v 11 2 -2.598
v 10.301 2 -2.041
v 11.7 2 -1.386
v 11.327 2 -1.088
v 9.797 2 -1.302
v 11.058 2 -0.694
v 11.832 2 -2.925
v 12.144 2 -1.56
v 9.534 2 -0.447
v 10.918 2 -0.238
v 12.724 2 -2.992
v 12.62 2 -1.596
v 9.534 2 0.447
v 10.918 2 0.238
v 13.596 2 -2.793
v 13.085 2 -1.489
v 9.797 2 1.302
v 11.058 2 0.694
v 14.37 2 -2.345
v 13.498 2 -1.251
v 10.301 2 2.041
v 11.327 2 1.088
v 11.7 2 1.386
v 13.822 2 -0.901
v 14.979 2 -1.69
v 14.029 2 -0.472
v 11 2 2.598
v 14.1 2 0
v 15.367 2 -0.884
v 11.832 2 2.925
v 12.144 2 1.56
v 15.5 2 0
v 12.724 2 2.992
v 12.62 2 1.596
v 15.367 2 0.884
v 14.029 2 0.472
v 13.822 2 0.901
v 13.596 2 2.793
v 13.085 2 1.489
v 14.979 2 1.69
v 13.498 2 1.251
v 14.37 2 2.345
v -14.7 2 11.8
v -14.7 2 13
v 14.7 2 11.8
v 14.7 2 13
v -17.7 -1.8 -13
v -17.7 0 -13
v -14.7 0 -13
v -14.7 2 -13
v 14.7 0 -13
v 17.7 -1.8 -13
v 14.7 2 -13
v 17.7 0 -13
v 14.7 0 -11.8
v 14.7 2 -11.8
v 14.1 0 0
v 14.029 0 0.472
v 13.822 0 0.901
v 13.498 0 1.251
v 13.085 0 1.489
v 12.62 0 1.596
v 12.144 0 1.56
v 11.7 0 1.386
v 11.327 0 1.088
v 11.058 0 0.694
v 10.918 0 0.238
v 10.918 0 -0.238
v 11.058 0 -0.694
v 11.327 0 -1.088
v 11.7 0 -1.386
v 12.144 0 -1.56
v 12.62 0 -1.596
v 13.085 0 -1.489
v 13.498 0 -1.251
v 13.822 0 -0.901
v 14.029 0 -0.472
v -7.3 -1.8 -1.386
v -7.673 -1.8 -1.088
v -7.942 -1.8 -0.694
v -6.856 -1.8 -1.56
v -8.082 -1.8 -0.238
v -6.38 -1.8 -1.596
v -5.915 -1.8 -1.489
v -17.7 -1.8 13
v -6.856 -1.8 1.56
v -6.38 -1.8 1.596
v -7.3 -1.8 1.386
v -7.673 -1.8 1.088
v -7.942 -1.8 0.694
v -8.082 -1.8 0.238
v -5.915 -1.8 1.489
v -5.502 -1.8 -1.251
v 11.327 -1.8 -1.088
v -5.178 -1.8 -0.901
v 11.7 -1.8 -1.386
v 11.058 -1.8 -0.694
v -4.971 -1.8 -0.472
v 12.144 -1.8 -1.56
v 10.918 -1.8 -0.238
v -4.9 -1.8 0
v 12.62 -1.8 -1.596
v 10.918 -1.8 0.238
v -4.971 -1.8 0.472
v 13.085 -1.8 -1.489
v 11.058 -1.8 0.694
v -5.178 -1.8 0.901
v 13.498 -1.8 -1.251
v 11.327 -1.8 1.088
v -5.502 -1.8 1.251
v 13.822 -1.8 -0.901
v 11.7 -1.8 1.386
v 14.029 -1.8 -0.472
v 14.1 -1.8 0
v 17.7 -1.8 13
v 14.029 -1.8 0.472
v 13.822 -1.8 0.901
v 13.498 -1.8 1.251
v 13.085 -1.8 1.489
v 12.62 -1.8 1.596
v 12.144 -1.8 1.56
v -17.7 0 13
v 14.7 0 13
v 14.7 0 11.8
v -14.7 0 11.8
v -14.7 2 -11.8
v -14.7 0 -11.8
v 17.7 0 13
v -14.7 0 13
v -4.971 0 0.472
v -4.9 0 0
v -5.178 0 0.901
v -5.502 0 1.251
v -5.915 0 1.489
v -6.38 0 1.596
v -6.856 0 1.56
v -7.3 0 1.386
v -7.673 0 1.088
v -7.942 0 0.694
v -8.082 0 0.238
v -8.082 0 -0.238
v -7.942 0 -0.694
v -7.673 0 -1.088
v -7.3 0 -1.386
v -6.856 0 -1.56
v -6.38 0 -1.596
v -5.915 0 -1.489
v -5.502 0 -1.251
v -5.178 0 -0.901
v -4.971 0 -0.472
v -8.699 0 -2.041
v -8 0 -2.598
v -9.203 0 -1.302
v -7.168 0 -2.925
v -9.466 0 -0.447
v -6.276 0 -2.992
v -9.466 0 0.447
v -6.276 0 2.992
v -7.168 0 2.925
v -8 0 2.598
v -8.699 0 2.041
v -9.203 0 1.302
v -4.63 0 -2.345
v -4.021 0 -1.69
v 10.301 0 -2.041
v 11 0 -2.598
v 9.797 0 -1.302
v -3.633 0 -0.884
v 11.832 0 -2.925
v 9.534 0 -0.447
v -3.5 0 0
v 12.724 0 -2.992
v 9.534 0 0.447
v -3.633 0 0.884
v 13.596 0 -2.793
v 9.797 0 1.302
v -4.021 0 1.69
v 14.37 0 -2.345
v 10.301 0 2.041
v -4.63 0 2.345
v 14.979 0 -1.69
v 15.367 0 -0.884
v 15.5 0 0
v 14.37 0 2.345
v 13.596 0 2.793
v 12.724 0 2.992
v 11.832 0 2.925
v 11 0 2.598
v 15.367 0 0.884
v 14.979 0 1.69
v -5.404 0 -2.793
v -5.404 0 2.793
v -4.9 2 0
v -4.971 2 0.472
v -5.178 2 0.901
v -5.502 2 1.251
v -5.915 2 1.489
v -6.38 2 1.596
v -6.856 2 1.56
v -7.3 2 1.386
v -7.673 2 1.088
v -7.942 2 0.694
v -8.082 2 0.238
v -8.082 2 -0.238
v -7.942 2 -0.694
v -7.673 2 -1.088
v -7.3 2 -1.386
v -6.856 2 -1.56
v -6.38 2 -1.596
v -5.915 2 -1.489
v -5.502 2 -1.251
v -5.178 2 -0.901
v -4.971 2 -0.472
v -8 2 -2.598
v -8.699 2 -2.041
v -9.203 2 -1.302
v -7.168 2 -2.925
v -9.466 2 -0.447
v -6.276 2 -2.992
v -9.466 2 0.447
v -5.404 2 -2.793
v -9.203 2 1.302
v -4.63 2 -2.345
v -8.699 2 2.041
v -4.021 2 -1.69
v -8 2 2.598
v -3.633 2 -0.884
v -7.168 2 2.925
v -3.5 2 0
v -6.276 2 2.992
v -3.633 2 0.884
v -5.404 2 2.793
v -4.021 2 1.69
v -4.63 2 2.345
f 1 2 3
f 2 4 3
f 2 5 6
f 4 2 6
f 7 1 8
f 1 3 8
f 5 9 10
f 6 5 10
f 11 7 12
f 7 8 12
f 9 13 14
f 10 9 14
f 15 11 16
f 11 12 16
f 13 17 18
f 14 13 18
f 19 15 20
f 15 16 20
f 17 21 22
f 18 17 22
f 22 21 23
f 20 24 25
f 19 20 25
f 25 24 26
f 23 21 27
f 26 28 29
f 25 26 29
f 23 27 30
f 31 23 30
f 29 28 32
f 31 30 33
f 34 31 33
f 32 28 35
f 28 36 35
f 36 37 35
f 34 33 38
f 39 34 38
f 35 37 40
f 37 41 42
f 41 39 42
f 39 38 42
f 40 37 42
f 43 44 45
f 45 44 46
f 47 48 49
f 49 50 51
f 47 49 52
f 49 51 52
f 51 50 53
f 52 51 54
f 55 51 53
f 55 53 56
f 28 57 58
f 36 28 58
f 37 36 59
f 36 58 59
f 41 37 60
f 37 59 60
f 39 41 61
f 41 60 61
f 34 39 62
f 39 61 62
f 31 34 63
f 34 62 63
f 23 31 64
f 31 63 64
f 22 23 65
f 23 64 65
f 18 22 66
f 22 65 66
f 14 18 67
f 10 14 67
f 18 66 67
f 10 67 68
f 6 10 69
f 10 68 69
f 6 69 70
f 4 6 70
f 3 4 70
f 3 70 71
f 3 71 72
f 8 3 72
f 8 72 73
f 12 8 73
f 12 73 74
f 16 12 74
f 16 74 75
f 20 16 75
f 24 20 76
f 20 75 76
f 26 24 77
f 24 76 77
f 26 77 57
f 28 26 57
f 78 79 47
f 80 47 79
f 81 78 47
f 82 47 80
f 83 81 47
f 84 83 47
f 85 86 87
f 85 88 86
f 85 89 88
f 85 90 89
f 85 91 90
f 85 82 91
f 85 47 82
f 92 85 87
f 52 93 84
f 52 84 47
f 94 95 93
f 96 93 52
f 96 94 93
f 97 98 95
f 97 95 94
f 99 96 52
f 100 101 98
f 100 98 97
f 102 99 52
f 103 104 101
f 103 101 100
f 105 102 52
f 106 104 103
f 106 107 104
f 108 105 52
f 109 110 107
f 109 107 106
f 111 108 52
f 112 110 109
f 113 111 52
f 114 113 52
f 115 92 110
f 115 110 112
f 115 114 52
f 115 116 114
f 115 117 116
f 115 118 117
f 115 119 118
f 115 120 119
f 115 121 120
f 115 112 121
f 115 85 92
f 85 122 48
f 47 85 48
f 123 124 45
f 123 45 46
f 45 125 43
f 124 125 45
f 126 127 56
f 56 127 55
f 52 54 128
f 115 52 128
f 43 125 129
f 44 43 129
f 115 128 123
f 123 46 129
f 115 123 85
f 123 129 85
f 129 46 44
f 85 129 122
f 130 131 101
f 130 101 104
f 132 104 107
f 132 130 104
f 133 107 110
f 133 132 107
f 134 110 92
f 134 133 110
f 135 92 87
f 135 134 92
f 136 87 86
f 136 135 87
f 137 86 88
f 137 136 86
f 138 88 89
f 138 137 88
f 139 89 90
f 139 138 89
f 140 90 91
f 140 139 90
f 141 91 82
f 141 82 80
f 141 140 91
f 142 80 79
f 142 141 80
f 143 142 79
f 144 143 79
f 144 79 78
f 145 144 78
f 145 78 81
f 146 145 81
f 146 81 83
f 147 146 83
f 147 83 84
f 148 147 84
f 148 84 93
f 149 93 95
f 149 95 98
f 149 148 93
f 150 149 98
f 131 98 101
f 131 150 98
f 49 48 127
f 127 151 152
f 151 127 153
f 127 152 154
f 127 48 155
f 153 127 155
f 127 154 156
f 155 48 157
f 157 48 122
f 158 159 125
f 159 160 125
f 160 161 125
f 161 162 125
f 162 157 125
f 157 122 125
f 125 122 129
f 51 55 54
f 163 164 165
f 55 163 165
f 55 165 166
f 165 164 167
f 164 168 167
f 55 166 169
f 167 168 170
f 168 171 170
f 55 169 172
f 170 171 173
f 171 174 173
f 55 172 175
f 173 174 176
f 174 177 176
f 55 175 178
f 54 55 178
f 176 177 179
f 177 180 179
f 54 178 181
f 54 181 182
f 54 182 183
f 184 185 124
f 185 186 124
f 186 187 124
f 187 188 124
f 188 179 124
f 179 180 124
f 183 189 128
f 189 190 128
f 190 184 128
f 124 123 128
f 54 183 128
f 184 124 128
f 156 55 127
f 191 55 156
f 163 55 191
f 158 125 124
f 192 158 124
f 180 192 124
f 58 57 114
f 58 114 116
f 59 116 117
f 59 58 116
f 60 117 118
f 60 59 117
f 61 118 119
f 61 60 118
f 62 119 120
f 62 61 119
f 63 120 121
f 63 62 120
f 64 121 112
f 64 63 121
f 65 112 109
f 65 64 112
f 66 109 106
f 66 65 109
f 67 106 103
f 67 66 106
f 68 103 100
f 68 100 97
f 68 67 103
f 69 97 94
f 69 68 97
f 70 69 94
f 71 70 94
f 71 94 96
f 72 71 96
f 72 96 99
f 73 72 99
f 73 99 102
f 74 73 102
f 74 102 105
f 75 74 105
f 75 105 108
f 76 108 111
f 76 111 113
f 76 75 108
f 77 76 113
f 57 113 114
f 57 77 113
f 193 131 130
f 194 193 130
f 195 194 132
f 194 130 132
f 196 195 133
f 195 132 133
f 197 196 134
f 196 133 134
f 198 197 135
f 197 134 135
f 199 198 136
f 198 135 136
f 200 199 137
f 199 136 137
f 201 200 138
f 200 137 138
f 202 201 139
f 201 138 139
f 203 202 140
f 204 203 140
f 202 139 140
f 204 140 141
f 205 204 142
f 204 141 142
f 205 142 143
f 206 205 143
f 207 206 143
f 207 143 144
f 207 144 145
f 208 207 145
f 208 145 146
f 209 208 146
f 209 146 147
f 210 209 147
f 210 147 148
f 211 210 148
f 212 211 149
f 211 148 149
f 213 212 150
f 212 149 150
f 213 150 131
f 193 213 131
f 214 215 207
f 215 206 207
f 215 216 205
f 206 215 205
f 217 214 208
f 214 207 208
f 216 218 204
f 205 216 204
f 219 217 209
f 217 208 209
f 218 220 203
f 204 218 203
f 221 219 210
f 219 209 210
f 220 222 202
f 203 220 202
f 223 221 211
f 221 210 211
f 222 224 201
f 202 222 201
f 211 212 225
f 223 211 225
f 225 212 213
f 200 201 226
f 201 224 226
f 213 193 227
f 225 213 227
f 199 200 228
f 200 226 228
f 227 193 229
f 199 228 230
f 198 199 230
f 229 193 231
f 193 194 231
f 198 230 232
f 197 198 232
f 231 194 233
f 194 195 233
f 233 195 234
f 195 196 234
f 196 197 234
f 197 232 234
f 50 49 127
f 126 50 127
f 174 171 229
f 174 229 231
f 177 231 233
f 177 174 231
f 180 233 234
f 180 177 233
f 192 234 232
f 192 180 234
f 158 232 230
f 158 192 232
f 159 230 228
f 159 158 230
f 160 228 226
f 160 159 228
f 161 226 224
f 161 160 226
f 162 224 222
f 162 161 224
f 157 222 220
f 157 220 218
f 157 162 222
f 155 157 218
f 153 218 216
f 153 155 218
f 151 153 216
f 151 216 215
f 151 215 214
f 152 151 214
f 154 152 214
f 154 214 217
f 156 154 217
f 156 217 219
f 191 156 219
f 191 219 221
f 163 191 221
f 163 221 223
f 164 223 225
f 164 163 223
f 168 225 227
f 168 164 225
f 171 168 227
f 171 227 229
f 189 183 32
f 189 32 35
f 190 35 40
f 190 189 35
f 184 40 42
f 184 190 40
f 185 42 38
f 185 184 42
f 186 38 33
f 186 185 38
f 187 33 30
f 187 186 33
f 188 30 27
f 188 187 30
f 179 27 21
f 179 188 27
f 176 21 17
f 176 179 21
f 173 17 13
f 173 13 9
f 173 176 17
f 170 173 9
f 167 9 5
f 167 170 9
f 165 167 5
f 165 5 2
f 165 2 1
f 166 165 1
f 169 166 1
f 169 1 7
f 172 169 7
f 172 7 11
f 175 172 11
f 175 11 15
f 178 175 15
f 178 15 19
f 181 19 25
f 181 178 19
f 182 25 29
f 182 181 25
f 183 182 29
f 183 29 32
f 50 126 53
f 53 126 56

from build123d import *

# Parameters (mm, degrees)
F0_R     = 3
F0_W     = 29.4
F0_H     = 1.2
F0_R_2   = 1.6
F1_DEPTH = 1.8
F2_DEPTH = 2


# Not quite as in the source:
# - a feature names something its author has since deleted; it is built from what else it names


with BuildPart() as f1:
    # F0 (on Front) → F1 (new body)
    with BuildSketch(Plane.XZ):
        Polygon((-14.7, 13), (-17.7, 13), (-17.7, -13), (-14.7, -13), (-14.7, -11.8), (14.7, -11.8), (14.7, -13), (17.7, -13), (17.7, 13), (14.7, 13), (14.7, 11.8), (-14.7, 11.8), align=None)
        with Locations((-6.5, 0)):
            Circle(F0_R, mode=Mode.SUBTRACT)
        with Locations((12.5, 0)):
            Circle(F0_R, mode=Mode.SUBTRACT)
        with Locations((0, 12.4)):
            Rectangle(F0_W, F0_H)
        with Locations((0, -12.4)):
            Rectangle(F0_W, F0_H)
        with Locations((-6.5, 0)):
            Circle(F0_R)
        with Locations((-6.5, 0)):
            Circle(F0_R_2, mode=Mode.SUBTRACT)
        with Locations((12.5, 0)):
            Circle(F0_R)
        with Locations((12.5, 0)):
            Circle(F0_R_2, mode=Mode.SUBTRACT)
    extrude(amount=F1_DEPTH)

    # F0 (on Front) → F2 (join)
    with BuildSketch(Plane.XZ):
        with Locations((12.5, 0)):
            Circle(F0_R)
        with Locations((12.5, 0)):
            Circle(F0_R_2, mode=Mode.SUBTRACT)
        with Locations((-6.5, 0)):
            Circle(F0_R)
        with Locations((-6.5, 0)):
            Circle(F0_R_2, mode=Mode.SUBTRACT)
        with Locations((0, 12.4)):
            Rectangle(F0_W, F0_H)
        with Locations((0, -12.4)):
            Rectangle(F0_W, F0_H)
    extrude(amount=-F2_DEPTH)


solid = f1.part
